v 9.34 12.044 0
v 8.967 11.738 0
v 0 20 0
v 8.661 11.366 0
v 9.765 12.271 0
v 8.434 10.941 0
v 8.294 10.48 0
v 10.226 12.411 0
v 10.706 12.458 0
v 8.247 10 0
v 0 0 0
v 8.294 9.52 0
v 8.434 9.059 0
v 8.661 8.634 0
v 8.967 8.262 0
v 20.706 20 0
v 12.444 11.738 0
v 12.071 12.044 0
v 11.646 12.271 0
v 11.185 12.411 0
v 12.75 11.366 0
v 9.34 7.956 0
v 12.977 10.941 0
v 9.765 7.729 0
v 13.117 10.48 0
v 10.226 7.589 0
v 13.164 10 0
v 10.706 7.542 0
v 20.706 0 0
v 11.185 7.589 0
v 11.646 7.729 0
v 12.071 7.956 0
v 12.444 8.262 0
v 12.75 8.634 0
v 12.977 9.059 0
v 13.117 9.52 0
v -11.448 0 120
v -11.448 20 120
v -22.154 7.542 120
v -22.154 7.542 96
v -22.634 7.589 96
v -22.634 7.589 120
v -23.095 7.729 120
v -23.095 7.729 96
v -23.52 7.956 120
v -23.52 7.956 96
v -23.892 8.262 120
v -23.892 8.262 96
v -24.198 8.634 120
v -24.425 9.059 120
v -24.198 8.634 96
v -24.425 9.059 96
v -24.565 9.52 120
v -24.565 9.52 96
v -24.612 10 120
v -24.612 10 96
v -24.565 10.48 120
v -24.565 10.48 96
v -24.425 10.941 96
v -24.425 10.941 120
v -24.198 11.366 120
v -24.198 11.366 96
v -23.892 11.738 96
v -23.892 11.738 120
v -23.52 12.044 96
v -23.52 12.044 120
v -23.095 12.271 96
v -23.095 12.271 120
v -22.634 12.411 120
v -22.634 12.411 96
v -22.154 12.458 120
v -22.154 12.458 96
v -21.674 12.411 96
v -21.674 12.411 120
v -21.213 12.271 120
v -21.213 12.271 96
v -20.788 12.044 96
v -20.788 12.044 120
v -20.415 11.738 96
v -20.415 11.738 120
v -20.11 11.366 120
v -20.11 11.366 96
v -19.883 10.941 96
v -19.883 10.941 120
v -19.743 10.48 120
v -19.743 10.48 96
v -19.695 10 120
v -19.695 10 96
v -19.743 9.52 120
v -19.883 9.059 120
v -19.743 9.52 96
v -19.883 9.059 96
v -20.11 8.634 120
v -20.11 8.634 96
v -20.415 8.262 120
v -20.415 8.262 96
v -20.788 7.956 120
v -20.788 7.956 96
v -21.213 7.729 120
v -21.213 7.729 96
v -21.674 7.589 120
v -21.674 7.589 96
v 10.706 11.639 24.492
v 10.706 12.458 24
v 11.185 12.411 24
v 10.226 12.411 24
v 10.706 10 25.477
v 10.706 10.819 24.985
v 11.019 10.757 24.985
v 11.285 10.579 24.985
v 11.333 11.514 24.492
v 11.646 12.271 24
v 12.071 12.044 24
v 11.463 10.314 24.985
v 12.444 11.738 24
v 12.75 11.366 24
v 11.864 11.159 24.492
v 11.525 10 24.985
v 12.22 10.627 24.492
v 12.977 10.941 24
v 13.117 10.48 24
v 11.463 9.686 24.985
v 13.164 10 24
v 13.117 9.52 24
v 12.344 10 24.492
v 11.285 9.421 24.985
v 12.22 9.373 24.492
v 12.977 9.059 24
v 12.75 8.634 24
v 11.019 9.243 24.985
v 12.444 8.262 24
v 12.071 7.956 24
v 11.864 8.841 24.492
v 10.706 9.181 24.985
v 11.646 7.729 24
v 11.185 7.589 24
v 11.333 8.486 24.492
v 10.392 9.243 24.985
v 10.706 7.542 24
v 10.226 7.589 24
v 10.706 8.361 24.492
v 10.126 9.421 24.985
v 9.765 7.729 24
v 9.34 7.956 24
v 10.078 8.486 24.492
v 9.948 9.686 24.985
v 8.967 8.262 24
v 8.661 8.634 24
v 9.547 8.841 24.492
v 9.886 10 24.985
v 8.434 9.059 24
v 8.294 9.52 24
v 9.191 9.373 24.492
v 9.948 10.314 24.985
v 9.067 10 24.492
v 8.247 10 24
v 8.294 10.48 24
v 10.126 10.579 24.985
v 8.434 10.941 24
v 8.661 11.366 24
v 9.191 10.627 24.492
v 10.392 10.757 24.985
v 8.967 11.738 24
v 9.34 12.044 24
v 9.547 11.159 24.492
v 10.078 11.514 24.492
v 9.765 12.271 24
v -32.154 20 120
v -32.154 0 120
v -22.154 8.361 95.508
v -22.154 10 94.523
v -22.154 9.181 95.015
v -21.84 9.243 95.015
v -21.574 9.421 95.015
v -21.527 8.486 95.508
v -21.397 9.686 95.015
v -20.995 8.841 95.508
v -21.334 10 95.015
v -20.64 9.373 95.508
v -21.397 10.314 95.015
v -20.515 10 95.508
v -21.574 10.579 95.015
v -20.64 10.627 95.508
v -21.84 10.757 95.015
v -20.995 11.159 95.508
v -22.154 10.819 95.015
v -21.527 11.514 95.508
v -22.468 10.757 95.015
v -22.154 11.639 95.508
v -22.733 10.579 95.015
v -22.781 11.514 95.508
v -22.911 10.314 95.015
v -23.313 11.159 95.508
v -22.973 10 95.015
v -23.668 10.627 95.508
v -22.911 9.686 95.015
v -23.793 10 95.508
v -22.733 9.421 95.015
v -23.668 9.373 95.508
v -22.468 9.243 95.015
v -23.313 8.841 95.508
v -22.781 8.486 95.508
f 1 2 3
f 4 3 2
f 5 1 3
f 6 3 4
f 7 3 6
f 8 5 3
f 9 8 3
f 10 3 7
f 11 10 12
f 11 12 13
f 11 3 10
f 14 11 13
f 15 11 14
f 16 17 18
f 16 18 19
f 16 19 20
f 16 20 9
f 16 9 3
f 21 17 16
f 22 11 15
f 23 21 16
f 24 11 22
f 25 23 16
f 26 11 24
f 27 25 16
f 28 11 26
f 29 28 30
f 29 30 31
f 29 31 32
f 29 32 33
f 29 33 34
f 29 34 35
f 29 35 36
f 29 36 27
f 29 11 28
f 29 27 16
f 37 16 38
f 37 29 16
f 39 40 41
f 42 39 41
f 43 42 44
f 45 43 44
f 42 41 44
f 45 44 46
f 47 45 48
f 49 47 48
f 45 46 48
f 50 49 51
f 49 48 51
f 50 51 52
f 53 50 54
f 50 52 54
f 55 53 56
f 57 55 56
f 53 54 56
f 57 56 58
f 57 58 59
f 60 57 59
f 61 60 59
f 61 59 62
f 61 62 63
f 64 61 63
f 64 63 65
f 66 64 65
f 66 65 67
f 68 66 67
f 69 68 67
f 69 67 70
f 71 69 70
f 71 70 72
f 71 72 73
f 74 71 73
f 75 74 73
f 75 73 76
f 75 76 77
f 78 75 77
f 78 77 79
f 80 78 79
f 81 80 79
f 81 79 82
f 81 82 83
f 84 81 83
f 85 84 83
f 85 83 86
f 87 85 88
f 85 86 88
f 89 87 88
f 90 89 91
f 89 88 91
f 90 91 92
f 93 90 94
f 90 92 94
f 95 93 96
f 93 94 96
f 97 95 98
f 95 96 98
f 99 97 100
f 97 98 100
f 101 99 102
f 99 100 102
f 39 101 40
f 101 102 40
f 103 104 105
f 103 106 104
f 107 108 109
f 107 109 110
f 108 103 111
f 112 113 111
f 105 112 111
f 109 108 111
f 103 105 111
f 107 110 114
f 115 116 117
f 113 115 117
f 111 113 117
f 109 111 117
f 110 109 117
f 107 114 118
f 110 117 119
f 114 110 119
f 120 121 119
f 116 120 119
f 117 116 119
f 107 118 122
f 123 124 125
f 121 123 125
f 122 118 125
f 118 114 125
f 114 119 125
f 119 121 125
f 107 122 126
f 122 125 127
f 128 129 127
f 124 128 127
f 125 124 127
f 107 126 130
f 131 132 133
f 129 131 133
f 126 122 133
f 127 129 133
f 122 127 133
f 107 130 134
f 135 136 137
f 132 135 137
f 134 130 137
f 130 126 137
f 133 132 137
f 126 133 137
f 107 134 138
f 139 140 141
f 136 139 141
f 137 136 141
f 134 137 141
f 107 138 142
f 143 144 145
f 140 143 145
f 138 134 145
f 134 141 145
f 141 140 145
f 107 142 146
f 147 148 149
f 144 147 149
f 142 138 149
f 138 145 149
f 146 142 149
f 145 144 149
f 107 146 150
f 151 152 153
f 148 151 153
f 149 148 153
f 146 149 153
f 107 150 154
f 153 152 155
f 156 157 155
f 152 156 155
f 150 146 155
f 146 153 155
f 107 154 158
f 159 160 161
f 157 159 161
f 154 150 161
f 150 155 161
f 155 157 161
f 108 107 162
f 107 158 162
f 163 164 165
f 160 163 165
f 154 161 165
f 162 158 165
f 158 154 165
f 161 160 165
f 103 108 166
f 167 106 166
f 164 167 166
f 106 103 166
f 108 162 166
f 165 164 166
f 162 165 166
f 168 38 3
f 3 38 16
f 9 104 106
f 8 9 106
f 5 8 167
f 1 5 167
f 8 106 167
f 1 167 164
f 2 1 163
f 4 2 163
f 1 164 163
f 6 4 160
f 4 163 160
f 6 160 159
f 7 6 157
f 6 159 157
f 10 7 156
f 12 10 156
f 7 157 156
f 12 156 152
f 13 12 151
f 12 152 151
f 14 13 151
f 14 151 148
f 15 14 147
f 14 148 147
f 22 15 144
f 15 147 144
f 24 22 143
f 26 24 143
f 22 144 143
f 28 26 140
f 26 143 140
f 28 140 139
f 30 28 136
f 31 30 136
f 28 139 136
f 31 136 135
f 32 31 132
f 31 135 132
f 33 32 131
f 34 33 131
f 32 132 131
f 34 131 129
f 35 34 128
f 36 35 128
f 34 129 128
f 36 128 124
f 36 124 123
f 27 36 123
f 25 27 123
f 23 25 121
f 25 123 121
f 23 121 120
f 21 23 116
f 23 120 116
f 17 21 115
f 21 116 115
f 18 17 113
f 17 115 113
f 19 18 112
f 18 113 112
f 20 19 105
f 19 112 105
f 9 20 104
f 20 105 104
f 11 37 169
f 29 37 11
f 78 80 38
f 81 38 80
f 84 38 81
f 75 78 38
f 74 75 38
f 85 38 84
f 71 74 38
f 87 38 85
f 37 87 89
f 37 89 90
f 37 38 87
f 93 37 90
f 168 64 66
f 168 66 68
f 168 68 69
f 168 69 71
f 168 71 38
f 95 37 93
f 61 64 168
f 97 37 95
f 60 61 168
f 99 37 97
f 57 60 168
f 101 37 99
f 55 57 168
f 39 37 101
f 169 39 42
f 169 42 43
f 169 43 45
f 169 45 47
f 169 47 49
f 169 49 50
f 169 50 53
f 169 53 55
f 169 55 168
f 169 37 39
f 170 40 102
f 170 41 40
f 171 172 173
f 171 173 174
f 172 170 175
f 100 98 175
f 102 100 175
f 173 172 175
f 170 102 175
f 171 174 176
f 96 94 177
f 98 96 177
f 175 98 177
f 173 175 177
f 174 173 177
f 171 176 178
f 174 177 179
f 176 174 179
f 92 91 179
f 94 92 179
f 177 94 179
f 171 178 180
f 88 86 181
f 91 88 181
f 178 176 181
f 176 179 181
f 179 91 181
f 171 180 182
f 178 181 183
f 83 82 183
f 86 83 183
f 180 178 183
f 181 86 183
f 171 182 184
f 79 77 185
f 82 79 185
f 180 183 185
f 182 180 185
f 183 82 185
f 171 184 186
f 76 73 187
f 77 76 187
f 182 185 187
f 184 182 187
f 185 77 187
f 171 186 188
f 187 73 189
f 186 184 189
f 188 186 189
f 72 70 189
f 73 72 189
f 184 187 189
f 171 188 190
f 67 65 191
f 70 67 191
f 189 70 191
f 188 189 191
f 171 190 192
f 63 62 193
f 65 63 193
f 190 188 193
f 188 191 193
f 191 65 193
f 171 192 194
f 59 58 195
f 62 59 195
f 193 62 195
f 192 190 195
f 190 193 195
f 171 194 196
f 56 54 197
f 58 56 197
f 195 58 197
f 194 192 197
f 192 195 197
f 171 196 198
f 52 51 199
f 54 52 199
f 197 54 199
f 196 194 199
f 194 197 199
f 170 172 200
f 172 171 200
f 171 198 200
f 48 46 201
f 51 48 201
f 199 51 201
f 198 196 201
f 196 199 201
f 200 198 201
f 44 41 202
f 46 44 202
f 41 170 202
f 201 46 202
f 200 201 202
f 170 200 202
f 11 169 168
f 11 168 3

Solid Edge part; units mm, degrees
sketch "Sketch1" plane through (0, 0, 0) normal (0, -1, 0) x (1, 0, 0)
  line L0 (-11.4484, 120) -> (-32.1539, 120)
  line L1 (-32.1539, 120) -> (0, 0)
  line L2 (0, 0) -> (20.7055, 0)
  line L3 (20.7055, 0) -> (-11.4484, 120)
extrude "Protrusion1" add sketch "Sketch1" against normal blind 20
hole "Agujero_3" at (-22.1539, 10, 120) direction (0, 0, -1) diameter 4.917 depth 24 tip angle 118 thread major 6 thread length 20
hole "Agujero_4" at (10.7055, 10, 0) direction (0, 0, 1) diameter 4.917 depth 24 tip angle 118 thread major 6 thread length 20
properties part number "1976-1100-002" material "Acero, estructural"
